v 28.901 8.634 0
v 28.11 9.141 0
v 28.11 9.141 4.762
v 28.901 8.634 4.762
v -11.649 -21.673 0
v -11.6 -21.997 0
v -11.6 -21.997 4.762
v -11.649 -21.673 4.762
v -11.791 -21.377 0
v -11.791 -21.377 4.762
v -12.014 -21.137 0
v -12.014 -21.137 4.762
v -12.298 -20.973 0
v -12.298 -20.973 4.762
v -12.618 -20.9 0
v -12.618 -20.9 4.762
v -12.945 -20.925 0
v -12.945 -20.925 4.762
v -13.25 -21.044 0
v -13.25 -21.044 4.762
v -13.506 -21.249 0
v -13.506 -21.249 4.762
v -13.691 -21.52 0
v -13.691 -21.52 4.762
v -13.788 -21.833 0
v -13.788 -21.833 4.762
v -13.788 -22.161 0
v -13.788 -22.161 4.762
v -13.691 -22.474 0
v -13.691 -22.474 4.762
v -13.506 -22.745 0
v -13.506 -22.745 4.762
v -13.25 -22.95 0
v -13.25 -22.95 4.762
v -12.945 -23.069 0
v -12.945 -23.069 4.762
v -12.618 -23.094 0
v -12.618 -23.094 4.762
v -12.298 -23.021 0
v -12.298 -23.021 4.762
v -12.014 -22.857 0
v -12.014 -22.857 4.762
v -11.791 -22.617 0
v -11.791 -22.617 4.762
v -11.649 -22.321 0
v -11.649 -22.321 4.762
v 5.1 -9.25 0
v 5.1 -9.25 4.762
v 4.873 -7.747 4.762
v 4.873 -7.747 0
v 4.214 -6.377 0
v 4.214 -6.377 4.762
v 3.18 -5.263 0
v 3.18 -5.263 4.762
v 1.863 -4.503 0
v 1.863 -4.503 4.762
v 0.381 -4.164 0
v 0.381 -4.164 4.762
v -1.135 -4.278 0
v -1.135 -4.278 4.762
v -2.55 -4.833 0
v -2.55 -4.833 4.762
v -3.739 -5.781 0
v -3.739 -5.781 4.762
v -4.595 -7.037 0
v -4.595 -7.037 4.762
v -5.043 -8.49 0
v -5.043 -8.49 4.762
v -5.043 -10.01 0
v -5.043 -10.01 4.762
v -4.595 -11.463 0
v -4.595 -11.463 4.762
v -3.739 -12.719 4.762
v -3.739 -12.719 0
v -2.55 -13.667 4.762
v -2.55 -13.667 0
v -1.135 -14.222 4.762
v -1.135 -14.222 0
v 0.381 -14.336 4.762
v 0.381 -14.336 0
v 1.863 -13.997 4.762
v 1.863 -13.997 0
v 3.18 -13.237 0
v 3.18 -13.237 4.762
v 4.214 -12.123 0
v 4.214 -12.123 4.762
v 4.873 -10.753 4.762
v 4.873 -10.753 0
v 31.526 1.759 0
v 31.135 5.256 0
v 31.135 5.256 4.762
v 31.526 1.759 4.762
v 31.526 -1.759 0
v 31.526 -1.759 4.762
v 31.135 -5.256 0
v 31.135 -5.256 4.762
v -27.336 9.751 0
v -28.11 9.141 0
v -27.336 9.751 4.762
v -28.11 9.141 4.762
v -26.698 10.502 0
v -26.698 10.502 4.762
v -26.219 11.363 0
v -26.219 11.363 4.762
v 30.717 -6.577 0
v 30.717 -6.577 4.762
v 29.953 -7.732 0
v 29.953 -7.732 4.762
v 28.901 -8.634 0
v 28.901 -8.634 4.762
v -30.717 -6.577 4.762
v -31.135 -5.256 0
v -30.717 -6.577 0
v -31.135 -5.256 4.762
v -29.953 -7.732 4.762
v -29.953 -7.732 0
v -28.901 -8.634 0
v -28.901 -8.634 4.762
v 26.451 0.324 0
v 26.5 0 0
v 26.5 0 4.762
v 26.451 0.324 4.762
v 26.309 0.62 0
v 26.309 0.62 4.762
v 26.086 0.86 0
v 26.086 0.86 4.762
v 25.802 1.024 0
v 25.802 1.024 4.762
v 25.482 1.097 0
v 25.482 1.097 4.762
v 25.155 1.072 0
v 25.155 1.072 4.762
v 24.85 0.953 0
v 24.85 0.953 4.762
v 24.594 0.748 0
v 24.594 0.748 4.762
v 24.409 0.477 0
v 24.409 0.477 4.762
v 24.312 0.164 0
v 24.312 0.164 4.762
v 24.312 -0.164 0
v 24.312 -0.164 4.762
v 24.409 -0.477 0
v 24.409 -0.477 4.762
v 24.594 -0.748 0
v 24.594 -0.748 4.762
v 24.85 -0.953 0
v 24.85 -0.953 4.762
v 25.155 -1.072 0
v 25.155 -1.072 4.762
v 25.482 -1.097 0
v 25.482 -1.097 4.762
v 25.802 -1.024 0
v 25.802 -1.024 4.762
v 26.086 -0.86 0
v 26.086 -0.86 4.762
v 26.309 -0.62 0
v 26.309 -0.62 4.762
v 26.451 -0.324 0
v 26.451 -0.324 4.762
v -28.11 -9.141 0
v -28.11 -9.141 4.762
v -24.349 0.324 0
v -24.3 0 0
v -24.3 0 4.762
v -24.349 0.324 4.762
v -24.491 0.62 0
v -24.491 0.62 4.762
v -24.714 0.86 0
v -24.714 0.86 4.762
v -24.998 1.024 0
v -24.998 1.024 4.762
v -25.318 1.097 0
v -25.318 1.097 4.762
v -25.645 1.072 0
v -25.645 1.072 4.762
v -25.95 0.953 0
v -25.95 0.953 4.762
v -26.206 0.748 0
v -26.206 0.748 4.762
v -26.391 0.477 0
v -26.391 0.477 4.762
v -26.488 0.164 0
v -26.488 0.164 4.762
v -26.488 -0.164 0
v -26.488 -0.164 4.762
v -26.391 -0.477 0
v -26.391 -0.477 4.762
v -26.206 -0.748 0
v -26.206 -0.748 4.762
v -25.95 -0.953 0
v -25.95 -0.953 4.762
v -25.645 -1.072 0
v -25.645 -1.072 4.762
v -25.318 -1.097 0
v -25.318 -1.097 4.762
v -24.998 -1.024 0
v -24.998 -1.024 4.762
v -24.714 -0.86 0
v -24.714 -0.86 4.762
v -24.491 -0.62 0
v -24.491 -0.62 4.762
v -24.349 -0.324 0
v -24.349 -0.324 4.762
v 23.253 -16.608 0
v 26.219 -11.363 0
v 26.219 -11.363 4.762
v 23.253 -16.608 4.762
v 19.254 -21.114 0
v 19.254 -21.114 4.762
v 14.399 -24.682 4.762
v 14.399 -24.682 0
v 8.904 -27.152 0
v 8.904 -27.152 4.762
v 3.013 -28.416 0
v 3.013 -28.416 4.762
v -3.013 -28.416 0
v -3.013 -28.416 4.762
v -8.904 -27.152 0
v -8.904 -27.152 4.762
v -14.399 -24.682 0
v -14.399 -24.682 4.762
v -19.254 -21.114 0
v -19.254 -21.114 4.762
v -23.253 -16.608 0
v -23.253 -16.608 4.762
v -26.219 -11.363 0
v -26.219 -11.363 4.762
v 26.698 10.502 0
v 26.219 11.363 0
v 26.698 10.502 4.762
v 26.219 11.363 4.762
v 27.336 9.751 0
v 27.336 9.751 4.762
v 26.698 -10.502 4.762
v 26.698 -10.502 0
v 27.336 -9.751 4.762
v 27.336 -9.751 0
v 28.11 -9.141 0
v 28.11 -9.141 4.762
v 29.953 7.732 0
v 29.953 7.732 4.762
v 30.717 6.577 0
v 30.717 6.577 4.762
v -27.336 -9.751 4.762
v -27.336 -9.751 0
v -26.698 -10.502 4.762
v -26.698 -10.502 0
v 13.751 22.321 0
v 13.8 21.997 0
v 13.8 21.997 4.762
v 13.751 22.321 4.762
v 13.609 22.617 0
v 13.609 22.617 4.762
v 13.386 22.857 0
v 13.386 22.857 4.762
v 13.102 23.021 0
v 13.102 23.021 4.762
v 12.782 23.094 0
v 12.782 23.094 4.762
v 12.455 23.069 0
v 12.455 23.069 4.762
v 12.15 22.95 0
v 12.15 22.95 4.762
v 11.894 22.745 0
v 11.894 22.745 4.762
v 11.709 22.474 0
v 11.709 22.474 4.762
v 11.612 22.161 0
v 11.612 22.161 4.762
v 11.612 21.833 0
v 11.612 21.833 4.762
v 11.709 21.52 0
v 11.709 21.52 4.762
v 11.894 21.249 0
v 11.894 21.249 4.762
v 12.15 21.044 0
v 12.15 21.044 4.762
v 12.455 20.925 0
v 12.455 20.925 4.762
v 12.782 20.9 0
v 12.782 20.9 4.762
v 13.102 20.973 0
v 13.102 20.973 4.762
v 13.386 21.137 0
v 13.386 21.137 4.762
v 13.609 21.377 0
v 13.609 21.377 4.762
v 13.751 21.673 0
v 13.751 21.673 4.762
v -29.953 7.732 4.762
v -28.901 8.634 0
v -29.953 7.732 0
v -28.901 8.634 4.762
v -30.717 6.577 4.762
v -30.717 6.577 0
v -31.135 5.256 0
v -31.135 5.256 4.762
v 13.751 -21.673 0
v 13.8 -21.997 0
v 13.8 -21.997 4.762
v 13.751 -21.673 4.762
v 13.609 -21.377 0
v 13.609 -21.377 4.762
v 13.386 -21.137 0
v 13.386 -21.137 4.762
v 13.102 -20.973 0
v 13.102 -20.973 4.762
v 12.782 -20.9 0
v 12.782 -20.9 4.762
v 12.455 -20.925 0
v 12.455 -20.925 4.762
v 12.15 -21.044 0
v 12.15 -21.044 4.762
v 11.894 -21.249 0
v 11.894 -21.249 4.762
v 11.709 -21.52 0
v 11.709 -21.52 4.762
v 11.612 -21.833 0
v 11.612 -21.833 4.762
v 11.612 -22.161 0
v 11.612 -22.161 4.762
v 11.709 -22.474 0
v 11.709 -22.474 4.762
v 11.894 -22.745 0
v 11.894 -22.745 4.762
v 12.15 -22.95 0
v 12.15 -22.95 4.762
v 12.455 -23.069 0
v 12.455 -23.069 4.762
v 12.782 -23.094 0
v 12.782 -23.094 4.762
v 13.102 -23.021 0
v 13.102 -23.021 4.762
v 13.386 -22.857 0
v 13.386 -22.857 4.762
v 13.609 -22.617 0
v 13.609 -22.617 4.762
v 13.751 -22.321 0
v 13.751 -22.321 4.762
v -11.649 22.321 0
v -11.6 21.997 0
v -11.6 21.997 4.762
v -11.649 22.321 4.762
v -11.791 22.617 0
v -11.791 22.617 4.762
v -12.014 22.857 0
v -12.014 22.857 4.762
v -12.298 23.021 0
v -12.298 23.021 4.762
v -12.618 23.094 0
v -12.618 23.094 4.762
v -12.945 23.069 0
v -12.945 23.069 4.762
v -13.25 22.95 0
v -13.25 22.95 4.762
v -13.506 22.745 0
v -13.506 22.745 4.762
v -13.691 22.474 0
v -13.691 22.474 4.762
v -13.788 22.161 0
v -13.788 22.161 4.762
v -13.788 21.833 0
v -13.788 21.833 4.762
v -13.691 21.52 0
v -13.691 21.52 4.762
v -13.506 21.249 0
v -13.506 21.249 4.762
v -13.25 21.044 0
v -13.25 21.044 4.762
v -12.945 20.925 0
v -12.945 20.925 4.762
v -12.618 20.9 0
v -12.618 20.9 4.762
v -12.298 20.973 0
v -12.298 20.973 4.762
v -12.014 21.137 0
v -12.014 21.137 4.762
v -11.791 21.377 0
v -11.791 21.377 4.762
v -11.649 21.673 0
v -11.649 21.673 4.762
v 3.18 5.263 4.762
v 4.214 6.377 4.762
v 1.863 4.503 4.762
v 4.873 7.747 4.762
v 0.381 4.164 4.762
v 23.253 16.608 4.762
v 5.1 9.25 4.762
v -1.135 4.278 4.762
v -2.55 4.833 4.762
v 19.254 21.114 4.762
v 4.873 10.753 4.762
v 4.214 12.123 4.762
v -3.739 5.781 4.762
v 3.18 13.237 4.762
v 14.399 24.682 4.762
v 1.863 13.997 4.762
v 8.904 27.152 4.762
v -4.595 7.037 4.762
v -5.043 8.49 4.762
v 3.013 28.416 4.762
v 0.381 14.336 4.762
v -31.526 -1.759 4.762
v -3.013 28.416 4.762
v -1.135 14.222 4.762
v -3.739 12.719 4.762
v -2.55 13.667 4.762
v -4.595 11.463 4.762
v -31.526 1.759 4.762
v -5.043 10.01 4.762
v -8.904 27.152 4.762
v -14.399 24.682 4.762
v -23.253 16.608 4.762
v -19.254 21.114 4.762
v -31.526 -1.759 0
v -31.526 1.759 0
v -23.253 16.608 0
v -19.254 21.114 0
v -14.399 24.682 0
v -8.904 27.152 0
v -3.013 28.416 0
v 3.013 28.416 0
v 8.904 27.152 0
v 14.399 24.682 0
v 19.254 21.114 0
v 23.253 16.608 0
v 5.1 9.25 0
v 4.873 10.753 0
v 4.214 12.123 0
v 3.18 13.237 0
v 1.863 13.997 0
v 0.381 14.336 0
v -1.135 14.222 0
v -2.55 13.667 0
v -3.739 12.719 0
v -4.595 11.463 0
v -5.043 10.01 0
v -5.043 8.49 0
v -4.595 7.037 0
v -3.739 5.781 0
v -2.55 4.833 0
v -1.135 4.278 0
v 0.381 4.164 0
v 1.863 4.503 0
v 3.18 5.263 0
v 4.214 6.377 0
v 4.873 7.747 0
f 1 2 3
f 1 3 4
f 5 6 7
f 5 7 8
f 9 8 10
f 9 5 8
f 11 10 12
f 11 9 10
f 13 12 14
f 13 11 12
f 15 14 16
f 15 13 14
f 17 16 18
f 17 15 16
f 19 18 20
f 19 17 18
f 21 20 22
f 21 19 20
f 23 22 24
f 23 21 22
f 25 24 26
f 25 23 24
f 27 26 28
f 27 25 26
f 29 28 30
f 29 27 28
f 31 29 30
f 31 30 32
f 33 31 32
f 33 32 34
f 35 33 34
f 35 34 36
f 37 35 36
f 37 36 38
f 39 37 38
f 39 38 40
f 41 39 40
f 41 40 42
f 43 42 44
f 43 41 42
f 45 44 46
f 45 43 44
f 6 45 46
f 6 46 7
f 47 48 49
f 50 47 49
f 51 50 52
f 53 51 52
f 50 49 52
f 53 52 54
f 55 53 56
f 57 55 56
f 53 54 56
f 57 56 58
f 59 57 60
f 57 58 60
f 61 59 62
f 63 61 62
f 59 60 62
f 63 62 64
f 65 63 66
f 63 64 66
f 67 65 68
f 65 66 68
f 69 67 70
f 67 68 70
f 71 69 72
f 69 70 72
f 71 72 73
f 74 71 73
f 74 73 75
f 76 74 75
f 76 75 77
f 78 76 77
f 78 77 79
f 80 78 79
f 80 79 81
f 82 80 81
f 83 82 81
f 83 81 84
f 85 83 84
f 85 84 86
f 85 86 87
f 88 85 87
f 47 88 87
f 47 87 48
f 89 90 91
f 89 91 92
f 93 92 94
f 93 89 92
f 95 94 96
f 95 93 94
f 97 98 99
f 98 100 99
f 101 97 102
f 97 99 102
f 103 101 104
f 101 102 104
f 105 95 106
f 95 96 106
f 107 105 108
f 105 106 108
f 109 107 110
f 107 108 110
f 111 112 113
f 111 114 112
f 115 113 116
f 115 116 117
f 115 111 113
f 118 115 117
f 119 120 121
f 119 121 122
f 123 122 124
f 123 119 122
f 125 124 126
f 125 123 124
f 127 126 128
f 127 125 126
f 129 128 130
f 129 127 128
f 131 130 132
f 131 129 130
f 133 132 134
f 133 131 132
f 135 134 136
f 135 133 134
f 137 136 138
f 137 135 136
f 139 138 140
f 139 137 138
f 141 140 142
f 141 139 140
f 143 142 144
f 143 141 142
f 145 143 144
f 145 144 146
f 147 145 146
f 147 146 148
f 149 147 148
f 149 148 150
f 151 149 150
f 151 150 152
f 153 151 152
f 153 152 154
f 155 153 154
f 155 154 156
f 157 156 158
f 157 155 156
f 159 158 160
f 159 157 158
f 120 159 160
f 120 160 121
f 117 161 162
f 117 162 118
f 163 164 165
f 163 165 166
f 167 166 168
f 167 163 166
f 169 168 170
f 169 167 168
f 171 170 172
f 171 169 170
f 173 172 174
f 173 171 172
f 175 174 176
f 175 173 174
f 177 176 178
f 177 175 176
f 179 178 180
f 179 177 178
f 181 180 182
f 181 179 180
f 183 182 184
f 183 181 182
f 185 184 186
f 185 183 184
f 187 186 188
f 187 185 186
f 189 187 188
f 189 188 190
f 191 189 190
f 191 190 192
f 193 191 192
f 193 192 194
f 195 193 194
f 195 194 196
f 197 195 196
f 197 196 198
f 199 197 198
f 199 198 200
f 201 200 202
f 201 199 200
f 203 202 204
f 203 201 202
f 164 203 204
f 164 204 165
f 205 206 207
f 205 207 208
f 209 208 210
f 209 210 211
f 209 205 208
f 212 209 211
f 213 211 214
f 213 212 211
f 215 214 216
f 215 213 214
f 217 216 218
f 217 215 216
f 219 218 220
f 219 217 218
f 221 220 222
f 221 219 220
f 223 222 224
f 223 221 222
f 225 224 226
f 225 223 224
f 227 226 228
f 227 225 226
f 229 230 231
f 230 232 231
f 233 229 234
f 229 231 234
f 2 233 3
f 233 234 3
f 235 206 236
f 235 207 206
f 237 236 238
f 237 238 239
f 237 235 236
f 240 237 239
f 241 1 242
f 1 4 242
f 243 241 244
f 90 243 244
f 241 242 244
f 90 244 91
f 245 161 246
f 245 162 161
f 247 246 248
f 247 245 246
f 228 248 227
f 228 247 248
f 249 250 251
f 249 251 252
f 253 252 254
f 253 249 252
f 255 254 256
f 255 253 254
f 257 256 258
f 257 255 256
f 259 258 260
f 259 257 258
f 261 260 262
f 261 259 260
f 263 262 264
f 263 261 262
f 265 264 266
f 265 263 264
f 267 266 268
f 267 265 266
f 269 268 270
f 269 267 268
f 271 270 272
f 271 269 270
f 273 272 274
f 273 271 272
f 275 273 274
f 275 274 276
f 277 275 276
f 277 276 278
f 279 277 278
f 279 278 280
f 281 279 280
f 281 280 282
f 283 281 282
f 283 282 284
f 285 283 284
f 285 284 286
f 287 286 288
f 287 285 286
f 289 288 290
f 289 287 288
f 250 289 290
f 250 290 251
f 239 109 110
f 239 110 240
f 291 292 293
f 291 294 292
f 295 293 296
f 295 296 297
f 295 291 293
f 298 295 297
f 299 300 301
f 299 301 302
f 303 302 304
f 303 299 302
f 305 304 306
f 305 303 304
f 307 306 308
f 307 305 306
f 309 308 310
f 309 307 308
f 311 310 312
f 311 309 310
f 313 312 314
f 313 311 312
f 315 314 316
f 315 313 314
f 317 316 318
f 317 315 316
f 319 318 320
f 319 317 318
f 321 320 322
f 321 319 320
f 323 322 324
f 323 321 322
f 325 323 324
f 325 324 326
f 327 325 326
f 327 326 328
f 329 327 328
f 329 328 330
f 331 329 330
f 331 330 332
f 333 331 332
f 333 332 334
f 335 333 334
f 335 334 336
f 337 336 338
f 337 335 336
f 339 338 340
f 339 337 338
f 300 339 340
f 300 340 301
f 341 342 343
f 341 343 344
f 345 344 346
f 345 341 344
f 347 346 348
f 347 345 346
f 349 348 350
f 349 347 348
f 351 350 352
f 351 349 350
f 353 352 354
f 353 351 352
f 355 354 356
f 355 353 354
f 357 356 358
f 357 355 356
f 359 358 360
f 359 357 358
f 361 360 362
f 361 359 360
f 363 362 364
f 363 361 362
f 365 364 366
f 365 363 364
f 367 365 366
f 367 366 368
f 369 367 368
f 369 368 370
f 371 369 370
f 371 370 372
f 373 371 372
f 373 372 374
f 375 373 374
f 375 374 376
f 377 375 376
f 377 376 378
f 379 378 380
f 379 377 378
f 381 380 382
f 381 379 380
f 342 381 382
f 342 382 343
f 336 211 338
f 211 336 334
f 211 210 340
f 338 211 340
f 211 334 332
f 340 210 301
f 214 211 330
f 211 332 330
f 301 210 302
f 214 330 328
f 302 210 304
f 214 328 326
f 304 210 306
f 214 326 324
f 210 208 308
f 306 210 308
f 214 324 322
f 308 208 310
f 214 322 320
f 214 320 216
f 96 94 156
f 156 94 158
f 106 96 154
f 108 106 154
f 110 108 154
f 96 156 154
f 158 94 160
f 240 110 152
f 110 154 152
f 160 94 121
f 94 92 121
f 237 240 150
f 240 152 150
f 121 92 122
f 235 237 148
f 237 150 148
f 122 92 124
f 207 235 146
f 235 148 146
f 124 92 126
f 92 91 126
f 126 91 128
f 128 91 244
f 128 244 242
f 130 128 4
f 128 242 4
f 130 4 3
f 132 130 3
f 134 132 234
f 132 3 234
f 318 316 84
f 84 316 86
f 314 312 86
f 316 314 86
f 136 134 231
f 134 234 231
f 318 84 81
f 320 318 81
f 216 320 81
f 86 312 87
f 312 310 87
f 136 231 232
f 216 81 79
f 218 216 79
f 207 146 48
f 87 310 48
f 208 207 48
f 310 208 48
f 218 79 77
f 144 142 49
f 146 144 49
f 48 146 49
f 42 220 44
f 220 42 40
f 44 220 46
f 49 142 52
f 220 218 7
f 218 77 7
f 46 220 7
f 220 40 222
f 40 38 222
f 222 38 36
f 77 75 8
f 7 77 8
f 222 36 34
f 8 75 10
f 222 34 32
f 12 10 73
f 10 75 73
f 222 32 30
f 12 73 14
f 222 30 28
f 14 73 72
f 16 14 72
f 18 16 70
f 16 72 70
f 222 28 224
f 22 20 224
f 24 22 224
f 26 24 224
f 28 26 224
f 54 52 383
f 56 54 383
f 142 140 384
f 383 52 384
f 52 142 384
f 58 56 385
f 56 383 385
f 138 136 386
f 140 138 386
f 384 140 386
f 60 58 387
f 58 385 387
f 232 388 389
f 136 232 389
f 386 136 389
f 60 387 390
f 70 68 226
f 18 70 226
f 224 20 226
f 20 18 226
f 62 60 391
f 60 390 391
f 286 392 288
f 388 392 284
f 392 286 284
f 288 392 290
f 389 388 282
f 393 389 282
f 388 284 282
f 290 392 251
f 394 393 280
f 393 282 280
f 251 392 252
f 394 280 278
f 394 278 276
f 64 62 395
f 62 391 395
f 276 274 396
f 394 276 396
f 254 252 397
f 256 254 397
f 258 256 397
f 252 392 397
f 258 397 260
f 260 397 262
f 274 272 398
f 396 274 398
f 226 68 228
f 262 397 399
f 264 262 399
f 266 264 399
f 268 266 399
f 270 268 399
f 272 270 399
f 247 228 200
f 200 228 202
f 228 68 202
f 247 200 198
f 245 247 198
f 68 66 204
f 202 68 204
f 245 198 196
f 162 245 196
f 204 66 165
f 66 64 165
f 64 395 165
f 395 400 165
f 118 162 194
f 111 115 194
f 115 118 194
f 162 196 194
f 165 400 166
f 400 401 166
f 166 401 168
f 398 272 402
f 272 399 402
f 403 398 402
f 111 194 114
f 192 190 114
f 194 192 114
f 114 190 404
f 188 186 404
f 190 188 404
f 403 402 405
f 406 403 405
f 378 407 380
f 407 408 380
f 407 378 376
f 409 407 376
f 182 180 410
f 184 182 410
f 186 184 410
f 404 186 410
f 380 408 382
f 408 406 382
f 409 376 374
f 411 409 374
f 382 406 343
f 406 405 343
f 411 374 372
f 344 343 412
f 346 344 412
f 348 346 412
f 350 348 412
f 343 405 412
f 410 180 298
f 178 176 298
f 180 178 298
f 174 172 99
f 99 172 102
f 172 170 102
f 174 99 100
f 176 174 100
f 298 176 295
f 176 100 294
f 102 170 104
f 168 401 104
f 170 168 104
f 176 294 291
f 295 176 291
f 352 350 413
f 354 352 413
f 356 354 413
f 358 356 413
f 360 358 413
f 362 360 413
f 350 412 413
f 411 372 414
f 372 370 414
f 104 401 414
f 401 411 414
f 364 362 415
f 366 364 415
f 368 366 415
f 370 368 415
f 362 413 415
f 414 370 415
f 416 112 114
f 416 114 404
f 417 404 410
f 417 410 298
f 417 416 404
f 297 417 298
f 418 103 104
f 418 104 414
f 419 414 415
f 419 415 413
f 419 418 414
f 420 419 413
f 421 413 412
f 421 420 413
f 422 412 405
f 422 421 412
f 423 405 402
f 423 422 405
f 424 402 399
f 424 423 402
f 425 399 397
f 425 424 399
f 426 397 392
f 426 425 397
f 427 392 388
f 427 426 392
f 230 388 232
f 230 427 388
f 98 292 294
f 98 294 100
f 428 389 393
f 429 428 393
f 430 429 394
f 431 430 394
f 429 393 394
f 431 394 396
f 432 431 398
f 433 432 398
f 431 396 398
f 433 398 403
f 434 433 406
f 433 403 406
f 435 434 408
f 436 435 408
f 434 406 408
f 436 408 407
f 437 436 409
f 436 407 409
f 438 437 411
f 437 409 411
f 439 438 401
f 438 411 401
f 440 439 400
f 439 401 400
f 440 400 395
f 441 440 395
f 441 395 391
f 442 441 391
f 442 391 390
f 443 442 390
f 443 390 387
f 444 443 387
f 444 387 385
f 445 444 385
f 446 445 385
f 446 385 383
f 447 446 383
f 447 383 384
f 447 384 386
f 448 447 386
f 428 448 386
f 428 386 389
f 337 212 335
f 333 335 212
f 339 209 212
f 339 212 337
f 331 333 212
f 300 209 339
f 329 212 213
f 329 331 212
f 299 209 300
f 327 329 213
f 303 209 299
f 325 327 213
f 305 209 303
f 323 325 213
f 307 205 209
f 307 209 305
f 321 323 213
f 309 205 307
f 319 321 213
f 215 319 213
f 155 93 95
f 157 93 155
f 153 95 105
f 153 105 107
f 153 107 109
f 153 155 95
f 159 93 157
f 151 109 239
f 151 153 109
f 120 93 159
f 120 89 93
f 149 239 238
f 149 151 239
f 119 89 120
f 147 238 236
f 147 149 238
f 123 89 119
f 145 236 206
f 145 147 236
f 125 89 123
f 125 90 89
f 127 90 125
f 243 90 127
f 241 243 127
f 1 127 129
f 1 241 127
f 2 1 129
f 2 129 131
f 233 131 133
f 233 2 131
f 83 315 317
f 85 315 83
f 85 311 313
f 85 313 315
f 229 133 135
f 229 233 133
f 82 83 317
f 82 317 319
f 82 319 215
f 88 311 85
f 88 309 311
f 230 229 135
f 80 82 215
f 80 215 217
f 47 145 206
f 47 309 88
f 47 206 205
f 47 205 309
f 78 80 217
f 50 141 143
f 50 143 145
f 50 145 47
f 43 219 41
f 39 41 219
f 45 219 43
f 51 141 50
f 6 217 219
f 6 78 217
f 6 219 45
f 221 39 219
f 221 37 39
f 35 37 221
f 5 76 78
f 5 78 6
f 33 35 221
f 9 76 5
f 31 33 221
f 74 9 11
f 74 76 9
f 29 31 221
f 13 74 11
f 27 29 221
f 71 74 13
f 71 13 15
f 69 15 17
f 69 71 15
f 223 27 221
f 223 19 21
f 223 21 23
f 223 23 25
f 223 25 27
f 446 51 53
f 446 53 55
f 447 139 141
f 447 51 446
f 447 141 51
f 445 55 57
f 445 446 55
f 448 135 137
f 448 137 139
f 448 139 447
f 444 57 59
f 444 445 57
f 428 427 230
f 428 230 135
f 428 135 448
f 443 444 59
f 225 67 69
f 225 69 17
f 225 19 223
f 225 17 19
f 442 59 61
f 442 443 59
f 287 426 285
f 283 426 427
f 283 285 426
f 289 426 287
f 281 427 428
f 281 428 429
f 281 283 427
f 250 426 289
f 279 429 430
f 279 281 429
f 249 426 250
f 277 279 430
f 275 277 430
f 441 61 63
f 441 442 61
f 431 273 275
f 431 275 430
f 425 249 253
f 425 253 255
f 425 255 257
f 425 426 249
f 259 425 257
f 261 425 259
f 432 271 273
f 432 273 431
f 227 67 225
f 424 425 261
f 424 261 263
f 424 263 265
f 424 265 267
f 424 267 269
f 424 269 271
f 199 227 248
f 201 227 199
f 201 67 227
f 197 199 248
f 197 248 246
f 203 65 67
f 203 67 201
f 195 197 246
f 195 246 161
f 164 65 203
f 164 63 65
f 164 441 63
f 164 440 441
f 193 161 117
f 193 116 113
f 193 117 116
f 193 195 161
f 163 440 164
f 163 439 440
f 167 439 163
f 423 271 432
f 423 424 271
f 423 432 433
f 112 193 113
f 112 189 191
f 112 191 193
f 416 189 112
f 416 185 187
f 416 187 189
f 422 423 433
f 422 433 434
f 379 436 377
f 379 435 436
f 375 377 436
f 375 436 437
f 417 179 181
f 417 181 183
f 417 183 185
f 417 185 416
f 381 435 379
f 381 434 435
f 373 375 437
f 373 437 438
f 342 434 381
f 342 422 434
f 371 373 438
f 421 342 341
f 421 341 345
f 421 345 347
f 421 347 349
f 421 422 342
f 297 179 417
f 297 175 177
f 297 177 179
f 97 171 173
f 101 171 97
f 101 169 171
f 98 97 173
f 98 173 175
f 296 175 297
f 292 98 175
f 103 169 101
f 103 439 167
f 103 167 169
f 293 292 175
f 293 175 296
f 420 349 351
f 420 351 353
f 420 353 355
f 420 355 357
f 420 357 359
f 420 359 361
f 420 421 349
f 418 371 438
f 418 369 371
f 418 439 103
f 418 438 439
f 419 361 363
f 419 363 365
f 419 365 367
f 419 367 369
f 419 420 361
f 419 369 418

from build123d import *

# Parameters (mm, degrees)
SKETCH1_R           = 1.1
BOSS_EXTRUDE1_DEPTH = 4.7625
FILLET1_R           = 5
SKETCH3_R           = 5.1
CUT_EXTRUDE2_DEPTH  = 5.7625


with BuildPart() as part:
    # Sketch1 → Boss-Extrude1 (new body)
    with BuildSketch(Plane.XY):
        with BuildLine():
            Line((-30.671332299, 7.5), (-26.768089678, 10))
            ThreePointArc((-26.768089678, 10), (0, 28.575), (26.768089678, 10))
            Line((26.768089678, 10), (30.671332299, 7.5))
            ThreePointArc((30.671332299, 7.5), (31.575, 0), (30.671332299, -7.5))
            Line((30.671332299, -7.5), (26.768089678, -10))
            ThreePointArc((26.768089678, -10), (0, -28.575), (-26.768089678, -10))
            Line((-26.768089678, -10), (-30.671332299, -7.5))
            ThreePointArc((-30.671332299, -7.5), (-31.575, 0), (-30.671332299, 7.5))
        make_face()
        with Locations((-25.4, 0)):
            Circle(SKETCH1_R, mode=Mode.SUBTRACT)
        with Locations((-12.7, 21.997045256)):
            Circle(SKETCH1_R, mode=Mode.SUBTRACT)
        with Locations((12.7, 21.997045256)):
            Circle(SKETCH1_R, mode=Mode.SUBTRACT)
        with Locations((25.4, 0)):
            Circle(SKETCH1_R, mode=Mode.SUBTRACT)
        with Locations((12.7, -21.997045256)):
            Circle(SKETCH1_R, mode=Mode.SUBTRACT)
        with Locations((-12.7, -21.997045256)):
            Circle(SKETCH1_R, mode=Mode.SUBTRACT)
    extrude(amount=BOSS_EXTRUDE1_DEPTH)

    # Fillet1
    fillet1_edges = [part.edges().sort_by_distance(p)[0] for p in [
        (30.671332299, -7.5, 2.38125),
        (26.768089678, -10, 2.38125),
        (-26.768089678, -10, 2.38125),
        (-30.671332299, -7.5, 2.38125),
        (-30.671332299, 7.5, 2.38125),
        (-26.768089678, 10, 2.38125),
        (26.768089678, 10, 2.38125),
        (30.671332299, 7.5, 2.38125),
    ]]
    fillet(fillet1_edges, radius=FILLET1_R)

    # Sketch3 → Cut-Extrude2 (cut, through all)
    with BuildSketch(Plane.XY.offset(4.7625)):
        with Locations((0, -9.25)):
            Circle(SKETCH3_R)
        with Locations((0, 9.25)):
            Circle(SKETCH3_R)
    extrude(amount=-CUT_EXTRUDE2_DEPTH, mode=Mode.SUBTRACT)


solid = part.part
